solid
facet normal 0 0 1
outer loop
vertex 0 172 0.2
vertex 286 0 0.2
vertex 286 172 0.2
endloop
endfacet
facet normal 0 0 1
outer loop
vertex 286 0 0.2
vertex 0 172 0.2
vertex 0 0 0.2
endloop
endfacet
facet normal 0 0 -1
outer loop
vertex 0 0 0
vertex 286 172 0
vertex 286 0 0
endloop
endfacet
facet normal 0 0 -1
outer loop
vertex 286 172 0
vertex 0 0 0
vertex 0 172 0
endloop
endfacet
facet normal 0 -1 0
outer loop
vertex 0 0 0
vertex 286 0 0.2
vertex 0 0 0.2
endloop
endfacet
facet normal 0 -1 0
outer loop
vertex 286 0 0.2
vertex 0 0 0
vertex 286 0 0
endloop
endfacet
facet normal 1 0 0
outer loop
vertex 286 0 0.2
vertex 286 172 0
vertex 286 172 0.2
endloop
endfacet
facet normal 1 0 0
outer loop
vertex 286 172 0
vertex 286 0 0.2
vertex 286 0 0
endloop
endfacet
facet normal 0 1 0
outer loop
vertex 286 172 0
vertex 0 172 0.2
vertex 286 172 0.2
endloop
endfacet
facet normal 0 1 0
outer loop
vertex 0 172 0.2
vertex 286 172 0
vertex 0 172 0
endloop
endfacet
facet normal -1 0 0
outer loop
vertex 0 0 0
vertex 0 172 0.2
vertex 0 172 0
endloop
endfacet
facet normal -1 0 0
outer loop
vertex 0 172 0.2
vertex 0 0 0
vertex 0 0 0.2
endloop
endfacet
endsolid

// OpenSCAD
$fa=4; $fs=0.4;
color("#000000") translate([0.000,0.000,0.000]) cube([286.000,172.000,0.200]);
